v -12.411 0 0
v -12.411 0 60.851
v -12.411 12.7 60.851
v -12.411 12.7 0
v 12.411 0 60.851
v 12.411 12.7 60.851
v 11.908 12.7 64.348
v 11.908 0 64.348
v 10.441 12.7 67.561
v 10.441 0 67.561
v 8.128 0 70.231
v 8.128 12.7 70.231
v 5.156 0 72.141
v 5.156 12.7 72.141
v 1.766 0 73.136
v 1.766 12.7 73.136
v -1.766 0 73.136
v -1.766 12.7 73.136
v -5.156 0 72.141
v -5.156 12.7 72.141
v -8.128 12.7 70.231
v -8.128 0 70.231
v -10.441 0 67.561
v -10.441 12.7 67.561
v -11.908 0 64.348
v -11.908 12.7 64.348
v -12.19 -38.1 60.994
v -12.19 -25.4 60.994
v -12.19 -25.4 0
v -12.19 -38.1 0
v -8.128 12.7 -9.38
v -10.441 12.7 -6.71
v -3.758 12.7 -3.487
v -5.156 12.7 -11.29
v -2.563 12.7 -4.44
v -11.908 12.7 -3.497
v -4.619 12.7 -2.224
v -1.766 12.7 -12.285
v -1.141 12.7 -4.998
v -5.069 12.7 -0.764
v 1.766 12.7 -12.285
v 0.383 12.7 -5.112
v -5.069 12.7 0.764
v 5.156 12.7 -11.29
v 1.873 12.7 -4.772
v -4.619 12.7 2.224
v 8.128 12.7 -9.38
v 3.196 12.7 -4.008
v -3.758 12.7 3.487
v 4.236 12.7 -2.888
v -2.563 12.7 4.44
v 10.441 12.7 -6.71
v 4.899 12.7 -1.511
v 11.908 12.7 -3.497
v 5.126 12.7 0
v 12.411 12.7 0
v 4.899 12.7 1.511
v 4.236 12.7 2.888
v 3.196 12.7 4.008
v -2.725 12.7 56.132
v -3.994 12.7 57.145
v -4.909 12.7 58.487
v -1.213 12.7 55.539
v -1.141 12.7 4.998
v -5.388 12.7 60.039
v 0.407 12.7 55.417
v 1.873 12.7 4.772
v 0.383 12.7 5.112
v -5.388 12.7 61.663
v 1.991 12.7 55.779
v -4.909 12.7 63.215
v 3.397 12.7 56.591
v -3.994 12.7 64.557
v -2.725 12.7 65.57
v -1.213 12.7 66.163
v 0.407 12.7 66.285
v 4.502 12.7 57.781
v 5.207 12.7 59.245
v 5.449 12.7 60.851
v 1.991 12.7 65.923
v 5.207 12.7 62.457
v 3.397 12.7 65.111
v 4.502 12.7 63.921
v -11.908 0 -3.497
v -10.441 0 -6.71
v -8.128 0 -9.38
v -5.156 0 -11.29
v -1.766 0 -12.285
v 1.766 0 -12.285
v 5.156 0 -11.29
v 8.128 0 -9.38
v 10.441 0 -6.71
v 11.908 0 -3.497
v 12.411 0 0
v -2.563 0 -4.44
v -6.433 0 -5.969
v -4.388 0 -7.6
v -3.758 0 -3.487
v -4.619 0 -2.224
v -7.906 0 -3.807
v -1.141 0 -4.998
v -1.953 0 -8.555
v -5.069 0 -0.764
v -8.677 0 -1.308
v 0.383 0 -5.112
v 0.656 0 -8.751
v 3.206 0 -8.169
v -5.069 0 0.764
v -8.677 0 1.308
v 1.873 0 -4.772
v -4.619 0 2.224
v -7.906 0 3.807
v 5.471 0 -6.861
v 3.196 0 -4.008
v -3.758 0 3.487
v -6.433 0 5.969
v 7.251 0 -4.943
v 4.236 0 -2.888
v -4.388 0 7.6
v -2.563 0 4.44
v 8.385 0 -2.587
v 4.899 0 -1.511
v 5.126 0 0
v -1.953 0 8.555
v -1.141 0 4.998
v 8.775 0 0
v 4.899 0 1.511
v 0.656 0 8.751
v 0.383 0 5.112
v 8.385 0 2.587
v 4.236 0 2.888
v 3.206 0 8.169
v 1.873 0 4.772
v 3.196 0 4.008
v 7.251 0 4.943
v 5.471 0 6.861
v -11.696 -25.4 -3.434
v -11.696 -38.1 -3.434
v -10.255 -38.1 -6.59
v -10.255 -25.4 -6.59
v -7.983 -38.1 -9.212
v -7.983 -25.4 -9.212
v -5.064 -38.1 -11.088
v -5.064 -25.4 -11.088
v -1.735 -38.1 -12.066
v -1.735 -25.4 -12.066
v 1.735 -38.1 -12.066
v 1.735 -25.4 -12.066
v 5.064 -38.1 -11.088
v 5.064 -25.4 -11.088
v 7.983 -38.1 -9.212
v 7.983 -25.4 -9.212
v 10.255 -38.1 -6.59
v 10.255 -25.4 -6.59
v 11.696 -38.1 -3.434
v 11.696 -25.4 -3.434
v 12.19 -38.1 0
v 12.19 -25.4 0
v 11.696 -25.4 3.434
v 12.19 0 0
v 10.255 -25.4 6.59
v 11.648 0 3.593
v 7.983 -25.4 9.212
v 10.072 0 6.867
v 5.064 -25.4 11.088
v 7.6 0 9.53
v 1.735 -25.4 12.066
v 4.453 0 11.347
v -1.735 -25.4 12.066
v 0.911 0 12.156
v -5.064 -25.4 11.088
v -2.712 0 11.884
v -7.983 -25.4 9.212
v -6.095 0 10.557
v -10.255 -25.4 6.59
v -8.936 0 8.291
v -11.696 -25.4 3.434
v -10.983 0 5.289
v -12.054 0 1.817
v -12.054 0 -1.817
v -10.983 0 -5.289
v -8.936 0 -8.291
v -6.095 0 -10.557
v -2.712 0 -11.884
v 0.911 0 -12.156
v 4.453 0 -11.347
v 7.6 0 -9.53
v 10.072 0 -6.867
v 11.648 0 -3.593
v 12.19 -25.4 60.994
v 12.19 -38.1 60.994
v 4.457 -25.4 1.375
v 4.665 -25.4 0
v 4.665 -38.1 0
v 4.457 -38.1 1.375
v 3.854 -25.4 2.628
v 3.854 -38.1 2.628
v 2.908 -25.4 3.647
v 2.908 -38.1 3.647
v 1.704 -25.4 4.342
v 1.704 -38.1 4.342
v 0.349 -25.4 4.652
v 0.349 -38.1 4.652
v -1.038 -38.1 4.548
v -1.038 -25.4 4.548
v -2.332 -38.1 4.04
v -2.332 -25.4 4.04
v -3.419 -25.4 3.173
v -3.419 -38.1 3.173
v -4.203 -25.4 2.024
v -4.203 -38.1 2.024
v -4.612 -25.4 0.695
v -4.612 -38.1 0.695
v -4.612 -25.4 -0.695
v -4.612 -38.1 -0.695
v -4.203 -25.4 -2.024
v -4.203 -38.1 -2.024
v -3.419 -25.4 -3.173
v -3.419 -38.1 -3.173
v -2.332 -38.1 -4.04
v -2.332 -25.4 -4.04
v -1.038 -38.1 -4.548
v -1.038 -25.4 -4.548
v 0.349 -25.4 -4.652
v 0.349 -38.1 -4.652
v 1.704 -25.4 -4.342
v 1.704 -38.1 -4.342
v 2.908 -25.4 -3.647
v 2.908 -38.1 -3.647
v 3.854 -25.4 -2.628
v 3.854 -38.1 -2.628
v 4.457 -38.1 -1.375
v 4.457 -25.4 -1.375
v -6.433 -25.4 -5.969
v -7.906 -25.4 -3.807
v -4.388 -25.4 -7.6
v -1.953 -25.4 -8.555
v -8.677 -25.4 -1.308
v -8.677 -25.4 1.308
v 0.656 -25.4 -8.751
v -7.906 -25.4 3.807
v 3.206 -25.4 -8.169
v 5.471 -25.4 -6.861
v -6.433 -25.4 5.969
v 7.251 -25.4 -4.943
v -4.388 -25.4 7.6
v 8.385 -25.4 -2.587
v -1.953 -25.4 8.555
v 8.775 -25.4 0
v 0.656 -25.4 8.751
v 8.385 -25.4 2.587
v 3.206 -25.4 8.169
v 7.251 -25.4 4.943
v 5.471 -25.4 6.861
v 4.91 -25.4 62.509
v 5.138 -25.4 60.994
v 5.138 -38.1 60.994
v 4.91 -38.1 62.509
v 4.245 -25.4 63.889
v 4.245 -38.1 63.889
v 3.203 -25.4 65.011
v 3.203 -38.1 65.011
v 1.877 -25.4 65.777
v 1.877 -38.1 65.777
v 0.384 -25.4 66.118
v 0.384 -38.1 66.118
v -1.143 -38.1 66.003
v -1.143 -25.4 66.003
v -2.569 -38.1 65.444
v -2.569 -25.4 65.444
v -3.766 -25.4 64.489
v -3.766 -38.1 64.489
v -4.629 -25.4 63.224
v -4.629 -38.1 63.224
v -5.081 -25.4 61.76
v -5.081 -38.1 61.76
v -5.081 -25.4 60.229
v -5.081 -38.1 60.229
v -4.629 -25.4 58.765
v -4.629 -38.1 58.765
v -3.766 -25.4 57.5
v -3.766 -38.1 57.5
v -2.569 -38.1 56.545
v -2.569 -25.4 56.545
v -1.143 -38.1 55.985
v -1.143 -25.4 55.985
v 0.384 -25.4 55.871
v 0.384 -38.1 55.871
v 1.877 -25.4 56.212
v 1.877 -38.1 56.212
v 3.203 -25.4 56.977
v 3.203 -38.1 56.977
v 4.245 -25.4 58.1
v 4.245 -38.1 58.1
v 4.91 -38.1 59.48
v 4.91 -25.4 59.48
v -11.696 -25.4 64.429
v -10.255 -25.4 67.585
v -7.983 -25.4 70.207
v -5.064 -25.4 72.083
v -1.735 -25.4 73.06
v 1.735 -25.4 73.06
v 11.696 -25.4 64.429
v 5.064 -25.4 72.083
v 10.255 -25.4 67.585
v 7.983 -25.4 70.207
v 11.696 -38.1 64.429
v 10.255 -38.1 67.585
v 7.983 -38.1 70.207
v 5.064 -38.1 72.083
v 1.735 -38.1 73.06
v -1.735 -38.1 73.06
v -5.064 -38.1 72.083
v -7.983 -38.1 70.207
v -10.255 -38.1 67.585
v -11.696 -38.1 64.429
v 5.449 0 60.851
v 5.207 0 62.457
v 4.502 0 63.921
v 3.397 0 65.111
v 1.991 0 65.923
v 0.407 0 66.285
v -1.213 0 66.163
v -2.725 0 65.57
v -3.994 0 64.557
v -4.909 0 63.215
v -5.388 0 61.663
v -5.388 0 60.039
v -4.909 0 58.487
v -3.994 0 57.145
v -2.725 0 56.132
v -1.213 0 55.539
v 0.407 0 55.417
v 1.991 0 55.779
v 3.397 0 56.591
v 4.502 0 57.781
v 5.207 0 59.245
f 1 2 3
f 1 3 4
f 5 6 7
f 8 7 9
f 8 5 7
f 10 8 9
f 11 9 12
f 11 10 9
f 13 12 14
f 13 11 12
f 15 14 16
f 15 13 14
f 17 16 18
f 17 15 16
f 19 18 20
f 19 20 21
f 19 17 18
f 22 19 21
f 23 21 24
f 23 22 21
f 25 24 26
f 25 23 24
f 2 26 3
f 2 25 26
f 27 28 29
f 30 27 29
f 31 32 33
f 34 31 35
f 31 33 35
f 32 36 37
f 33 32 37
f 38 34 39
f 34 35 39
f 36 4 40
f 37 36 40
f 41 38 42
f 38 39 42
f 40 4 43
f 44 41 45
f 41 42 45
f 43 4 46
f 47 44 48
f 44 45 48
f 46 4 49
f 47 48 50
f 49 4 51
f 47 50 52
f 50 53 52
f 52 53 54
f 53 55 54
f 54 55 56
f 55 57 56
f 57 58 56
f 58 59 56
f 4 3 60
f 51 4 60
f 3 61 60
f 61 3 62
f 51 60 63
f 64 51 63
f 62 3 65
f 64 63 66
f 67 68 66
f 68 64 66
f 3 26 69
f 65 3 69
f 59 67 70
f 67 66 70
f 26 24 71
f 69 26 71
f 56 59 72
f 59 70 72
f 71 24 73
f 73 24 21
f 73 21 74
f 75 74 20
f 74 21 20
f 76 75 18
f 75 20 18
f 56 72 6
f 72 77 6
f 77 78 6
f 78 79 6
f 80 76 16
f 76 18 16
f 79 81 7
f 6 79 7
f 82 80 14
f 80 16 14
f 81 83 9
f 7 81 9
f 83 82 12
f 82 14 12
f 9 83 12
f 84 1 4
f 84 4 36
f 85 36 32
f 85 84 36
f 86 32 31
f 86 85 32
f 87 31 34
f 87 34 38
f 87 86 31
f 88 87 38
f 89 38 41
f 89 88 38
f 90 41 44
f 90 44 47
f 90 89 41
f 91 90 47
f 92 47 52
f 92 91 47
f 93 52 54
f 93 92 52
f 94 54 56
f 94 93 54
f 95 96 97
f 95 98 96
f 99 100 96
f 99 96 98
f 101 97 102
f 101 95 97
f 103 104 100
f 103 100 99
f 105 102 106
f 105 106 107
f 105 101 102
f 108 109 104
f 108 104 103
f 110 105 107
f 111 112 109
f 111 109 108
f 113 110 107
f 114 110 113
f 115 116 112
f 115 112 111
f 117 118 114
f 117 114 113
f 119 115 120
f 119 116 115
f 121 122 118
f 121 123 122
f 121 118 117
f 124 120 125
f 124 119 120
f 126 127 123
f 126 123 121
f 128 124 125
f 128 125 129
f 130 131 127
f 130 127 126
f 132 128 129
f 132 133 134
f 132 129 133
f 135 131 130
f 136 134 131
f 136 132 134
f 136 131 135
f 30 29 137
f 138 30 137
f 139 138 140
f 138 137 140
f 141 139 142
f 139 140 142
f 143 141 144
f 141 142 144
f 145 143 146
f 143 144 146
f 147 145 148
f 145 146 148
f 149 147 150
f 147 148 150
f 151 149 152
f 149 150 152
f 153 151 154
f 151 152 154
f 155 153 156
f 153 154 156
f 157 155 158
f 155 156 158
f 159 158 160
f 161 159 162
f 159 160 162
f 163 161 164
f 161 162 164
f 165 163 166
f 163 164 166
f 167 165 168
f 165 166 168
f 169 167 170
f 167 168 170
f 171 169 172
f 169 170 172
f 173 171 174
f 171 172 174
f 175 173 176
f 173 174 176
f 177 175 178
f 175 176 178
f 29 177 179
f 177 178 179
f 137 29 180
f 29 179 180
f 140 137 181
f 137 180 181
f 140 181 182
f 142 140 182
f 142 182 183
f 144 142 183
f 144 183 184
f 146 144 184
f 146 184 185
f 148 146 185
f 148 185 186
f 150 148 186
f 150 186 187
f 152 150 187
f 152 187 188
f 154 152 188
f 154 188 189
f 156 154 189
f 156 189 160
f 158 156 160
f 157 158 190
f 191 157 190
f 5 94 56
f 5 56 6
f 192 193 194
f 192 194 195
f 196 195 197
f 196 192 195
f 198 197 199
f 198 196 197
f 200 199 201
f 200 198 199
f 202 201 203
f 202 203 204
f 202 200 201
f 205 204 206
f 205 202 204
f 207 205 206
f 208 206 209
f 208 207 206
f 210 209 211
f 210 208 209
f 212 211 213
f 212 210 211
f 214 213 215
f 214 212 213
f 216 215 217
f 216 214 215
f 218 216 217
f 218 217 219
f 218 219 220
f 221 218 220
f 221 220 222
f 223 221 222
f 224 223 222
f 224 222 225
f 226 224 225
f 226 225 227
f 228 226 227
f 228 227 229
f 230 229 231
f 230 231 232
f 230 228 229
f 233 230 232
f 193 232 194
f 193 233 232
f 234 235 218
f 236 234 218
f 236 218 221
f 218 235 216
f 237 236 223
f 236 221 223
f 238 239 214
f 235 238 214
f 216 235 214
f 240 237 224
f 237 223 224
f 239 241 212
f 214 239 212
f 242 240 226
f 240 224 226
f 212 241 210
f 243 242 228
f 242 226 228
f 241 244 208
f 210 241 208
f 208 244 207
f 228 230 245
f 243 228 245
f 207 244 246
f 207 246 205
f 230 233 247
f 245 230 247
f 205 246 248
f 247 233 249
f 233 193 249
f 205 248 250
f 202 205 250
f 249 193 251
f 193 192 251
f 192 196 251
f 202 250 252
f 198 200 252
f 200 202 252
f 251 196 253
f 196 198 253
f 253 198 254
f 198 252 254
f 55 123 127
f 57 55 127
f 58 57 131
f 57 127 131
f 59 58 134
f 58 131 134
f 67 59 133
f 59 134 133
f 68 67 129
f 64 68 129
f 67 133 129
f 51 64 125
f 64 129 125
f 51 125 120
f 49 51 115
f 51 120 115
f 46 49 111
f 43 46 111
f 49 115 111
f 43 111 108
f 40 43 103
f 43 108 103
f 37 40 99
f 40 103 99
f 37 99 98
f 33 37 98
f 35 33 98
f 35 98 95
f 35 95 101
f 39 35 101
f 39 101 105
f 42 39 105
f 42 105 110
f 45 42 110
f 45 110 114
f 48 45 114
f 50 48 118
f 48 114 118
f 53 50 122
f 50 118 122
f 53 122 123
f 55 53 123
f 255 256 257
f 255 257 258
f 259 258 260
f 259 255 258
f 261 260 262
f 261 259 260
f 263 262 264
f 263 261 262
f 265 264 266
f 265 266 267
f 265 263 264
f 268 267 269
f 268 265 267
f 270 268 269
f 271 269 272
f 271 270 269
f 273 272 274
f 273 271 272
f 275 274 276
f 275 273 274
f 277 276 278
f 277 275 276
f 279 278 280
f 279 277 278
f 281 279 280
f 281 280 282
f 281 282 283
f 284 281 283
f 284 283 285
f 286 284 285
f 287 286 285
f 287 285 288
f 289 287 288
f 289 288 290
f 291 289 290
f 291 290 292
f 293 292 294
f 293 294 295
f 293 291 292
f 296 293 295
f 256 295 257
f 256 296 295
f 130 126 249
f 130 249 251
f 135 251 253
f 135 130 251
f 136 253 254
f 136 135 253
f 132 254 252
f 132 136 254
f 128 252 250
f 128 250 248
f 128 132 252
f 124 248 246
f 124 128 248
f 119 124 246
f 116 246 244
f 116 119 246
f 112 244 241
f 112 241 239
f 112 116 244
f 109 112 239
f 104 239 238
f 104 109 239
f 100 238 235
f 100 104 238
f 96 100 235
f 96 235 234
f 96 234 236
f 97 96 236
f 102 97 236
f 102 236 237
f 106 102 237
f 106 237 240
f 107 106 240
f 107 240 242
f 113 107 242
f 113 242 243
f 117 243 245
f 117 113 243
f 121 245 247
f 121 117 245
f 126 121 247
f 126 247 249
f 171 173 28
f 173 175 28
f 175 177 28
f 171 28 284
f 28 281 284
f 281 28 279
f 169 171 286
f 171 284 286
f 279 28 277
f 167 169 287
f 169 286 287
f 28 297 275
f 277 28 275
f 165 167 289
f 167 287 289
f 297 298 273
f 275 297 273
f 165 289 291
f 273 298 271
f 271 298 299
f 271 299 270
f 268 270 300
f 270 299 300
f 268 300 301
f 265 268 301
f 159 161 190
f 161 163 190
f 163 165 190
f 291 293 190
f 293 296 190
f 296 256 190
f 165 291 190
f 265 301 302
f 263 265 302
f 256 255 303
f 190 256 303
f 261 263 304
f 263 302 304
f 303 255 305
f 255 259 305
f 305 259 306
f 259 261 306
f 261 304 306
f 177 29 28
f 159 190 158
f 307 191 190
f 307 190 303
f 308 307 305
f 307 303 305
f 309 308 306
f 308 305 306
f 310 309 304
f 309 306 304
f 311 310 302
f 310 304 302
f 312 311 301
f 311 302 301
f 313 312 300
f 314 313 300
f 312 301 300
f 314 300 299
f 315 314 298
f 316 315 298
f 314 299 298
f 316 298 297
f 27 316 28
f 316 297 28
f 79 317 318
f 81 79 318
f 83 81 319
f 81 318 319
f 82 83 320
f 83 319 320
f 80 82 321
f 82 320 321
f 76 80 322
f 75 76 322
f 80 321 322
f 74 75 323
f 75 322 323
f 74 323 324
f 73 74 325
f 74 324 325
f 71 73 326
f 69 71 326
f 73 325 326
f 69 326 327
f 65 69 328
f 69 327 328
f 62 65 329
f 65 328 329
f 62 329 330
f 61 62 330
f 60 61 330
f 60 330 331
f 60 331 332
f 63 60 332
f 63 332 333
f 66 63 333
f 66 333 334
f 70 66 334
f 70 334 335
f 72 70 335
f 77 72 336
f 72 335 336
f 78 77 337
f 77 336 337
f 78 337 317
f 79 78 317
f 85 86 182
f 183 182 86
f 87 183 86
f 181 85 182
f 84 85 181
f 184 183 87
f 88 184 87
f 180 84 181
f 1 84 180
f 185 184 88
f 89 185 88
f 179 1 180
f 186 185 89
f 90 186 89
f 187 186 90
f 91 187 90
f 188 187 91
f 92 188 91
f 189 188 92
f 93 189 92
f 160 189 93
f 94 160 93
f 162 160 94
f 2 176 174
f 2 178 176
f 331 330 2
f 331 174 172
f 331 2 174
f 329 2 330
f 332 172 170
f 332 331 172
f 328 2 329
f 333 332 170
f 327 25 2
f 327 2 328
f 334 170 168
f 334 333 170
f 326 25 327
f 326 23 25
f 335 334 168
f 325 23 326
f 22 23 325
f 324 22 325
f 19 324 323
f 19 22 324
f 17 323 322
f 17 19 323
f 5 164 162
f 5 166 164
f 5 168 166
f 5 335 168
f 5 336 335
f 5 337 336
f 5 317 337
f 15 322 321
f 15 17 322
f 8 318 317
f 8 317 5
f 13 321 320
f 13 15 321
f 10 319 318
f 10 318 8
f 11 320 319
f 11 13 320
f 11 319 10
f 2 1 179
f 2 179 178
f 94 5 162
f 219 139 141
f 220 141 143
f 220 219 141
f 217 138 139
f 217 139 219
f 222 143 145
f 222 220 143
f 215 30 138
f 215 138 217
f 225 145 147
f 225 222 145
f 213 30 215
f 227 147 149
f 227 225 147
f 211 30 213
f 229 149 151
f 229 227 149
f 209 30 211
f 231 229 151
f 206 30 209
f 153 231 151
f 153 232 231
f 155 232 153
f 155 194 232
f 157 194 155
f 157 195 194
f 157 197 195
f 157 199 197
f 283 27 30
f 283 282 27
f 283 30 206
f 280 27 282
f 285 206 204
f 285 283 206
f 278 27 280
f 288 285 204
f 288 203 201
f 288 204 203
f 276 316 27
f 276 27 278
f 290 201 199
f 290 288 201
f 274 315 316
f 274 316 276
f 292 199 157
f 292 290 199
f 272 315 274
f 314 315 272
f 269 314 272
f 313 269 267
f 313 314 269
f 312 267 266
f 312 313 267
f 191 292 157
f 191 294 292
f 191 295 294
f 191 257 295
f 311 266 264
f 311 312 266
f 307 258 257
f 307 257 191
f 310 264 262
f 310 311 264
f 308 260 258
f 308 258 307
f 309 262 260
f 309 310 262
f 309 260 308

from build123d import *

# Parameters (mm, degrees)
F0_R     = 12.189783
F0_R_2   = 8.77531
F1_DEPTH = 25.4
F2_R     = 5.126436
F2_R_2   = 5.449077
F3_DEPTH = 12.7
F4_R     = 4.664571
F4_R_2   = 5.13789
F5_DEPTH = 12.7


with BuildPart() as f1:
    # F0 (on Front) → F1 (new body)
    with BuildSketch(Plane.XZ):
        Circle(F0_R)
        Circle(F0_R_2, mode=Mode.SUBTRACT)
    extrude(amount=F1_DEPTH)

    # F2 (on Front) → F3 (join)
    with BuildSketch(Plane.XZ):
        with BuildLine():
            Line((-12.411189, 60.850978), (-12.411189, 0))
            ThreePointArc((-12.411189, 0), (0, -12.411189), (12.411188, 0))
            Line((12.411188, 0), (12.411188, 60.850978))
            ThreePointArc((12.411188, 60.850978), (0, 73.262167), (-12.411189, 60.850978))
        make_face()
        Circle(F2_R, mode=Mode.SUBTRACT)
        with Locations((0, 60.850978)):
            Circle(F2_R_2, mode=Mode.SUBTRACT)
    extrude(amount=-F3_DEPTH)

    # F4 (on face) → F5 (join)
    with BuildSketch(Plane.XZ.offset(25.4)):
        with BuildLine():
            Line((-12.189783, 60.994357), (-12.189783, 0))
            ThreePointArc((-12.189783, 0), (0, -12.189783), (12.189783, 0))
            Line((12.189783, 0), (12.189783, 60.994357))
            ThreePointArc((12.189783, 60.994357), (0, 73.18414), (-12.189783, 60.994357))
        make_face()
        Circle(F4_R, mode=Mode.SUBTRACT)
        with Locations((0, 60.994357)):
            Circle(F4_R_2, mode=Mode.SUBTRACT)
    extrude(amount=F5_DEPTH)


solid = f1.part
